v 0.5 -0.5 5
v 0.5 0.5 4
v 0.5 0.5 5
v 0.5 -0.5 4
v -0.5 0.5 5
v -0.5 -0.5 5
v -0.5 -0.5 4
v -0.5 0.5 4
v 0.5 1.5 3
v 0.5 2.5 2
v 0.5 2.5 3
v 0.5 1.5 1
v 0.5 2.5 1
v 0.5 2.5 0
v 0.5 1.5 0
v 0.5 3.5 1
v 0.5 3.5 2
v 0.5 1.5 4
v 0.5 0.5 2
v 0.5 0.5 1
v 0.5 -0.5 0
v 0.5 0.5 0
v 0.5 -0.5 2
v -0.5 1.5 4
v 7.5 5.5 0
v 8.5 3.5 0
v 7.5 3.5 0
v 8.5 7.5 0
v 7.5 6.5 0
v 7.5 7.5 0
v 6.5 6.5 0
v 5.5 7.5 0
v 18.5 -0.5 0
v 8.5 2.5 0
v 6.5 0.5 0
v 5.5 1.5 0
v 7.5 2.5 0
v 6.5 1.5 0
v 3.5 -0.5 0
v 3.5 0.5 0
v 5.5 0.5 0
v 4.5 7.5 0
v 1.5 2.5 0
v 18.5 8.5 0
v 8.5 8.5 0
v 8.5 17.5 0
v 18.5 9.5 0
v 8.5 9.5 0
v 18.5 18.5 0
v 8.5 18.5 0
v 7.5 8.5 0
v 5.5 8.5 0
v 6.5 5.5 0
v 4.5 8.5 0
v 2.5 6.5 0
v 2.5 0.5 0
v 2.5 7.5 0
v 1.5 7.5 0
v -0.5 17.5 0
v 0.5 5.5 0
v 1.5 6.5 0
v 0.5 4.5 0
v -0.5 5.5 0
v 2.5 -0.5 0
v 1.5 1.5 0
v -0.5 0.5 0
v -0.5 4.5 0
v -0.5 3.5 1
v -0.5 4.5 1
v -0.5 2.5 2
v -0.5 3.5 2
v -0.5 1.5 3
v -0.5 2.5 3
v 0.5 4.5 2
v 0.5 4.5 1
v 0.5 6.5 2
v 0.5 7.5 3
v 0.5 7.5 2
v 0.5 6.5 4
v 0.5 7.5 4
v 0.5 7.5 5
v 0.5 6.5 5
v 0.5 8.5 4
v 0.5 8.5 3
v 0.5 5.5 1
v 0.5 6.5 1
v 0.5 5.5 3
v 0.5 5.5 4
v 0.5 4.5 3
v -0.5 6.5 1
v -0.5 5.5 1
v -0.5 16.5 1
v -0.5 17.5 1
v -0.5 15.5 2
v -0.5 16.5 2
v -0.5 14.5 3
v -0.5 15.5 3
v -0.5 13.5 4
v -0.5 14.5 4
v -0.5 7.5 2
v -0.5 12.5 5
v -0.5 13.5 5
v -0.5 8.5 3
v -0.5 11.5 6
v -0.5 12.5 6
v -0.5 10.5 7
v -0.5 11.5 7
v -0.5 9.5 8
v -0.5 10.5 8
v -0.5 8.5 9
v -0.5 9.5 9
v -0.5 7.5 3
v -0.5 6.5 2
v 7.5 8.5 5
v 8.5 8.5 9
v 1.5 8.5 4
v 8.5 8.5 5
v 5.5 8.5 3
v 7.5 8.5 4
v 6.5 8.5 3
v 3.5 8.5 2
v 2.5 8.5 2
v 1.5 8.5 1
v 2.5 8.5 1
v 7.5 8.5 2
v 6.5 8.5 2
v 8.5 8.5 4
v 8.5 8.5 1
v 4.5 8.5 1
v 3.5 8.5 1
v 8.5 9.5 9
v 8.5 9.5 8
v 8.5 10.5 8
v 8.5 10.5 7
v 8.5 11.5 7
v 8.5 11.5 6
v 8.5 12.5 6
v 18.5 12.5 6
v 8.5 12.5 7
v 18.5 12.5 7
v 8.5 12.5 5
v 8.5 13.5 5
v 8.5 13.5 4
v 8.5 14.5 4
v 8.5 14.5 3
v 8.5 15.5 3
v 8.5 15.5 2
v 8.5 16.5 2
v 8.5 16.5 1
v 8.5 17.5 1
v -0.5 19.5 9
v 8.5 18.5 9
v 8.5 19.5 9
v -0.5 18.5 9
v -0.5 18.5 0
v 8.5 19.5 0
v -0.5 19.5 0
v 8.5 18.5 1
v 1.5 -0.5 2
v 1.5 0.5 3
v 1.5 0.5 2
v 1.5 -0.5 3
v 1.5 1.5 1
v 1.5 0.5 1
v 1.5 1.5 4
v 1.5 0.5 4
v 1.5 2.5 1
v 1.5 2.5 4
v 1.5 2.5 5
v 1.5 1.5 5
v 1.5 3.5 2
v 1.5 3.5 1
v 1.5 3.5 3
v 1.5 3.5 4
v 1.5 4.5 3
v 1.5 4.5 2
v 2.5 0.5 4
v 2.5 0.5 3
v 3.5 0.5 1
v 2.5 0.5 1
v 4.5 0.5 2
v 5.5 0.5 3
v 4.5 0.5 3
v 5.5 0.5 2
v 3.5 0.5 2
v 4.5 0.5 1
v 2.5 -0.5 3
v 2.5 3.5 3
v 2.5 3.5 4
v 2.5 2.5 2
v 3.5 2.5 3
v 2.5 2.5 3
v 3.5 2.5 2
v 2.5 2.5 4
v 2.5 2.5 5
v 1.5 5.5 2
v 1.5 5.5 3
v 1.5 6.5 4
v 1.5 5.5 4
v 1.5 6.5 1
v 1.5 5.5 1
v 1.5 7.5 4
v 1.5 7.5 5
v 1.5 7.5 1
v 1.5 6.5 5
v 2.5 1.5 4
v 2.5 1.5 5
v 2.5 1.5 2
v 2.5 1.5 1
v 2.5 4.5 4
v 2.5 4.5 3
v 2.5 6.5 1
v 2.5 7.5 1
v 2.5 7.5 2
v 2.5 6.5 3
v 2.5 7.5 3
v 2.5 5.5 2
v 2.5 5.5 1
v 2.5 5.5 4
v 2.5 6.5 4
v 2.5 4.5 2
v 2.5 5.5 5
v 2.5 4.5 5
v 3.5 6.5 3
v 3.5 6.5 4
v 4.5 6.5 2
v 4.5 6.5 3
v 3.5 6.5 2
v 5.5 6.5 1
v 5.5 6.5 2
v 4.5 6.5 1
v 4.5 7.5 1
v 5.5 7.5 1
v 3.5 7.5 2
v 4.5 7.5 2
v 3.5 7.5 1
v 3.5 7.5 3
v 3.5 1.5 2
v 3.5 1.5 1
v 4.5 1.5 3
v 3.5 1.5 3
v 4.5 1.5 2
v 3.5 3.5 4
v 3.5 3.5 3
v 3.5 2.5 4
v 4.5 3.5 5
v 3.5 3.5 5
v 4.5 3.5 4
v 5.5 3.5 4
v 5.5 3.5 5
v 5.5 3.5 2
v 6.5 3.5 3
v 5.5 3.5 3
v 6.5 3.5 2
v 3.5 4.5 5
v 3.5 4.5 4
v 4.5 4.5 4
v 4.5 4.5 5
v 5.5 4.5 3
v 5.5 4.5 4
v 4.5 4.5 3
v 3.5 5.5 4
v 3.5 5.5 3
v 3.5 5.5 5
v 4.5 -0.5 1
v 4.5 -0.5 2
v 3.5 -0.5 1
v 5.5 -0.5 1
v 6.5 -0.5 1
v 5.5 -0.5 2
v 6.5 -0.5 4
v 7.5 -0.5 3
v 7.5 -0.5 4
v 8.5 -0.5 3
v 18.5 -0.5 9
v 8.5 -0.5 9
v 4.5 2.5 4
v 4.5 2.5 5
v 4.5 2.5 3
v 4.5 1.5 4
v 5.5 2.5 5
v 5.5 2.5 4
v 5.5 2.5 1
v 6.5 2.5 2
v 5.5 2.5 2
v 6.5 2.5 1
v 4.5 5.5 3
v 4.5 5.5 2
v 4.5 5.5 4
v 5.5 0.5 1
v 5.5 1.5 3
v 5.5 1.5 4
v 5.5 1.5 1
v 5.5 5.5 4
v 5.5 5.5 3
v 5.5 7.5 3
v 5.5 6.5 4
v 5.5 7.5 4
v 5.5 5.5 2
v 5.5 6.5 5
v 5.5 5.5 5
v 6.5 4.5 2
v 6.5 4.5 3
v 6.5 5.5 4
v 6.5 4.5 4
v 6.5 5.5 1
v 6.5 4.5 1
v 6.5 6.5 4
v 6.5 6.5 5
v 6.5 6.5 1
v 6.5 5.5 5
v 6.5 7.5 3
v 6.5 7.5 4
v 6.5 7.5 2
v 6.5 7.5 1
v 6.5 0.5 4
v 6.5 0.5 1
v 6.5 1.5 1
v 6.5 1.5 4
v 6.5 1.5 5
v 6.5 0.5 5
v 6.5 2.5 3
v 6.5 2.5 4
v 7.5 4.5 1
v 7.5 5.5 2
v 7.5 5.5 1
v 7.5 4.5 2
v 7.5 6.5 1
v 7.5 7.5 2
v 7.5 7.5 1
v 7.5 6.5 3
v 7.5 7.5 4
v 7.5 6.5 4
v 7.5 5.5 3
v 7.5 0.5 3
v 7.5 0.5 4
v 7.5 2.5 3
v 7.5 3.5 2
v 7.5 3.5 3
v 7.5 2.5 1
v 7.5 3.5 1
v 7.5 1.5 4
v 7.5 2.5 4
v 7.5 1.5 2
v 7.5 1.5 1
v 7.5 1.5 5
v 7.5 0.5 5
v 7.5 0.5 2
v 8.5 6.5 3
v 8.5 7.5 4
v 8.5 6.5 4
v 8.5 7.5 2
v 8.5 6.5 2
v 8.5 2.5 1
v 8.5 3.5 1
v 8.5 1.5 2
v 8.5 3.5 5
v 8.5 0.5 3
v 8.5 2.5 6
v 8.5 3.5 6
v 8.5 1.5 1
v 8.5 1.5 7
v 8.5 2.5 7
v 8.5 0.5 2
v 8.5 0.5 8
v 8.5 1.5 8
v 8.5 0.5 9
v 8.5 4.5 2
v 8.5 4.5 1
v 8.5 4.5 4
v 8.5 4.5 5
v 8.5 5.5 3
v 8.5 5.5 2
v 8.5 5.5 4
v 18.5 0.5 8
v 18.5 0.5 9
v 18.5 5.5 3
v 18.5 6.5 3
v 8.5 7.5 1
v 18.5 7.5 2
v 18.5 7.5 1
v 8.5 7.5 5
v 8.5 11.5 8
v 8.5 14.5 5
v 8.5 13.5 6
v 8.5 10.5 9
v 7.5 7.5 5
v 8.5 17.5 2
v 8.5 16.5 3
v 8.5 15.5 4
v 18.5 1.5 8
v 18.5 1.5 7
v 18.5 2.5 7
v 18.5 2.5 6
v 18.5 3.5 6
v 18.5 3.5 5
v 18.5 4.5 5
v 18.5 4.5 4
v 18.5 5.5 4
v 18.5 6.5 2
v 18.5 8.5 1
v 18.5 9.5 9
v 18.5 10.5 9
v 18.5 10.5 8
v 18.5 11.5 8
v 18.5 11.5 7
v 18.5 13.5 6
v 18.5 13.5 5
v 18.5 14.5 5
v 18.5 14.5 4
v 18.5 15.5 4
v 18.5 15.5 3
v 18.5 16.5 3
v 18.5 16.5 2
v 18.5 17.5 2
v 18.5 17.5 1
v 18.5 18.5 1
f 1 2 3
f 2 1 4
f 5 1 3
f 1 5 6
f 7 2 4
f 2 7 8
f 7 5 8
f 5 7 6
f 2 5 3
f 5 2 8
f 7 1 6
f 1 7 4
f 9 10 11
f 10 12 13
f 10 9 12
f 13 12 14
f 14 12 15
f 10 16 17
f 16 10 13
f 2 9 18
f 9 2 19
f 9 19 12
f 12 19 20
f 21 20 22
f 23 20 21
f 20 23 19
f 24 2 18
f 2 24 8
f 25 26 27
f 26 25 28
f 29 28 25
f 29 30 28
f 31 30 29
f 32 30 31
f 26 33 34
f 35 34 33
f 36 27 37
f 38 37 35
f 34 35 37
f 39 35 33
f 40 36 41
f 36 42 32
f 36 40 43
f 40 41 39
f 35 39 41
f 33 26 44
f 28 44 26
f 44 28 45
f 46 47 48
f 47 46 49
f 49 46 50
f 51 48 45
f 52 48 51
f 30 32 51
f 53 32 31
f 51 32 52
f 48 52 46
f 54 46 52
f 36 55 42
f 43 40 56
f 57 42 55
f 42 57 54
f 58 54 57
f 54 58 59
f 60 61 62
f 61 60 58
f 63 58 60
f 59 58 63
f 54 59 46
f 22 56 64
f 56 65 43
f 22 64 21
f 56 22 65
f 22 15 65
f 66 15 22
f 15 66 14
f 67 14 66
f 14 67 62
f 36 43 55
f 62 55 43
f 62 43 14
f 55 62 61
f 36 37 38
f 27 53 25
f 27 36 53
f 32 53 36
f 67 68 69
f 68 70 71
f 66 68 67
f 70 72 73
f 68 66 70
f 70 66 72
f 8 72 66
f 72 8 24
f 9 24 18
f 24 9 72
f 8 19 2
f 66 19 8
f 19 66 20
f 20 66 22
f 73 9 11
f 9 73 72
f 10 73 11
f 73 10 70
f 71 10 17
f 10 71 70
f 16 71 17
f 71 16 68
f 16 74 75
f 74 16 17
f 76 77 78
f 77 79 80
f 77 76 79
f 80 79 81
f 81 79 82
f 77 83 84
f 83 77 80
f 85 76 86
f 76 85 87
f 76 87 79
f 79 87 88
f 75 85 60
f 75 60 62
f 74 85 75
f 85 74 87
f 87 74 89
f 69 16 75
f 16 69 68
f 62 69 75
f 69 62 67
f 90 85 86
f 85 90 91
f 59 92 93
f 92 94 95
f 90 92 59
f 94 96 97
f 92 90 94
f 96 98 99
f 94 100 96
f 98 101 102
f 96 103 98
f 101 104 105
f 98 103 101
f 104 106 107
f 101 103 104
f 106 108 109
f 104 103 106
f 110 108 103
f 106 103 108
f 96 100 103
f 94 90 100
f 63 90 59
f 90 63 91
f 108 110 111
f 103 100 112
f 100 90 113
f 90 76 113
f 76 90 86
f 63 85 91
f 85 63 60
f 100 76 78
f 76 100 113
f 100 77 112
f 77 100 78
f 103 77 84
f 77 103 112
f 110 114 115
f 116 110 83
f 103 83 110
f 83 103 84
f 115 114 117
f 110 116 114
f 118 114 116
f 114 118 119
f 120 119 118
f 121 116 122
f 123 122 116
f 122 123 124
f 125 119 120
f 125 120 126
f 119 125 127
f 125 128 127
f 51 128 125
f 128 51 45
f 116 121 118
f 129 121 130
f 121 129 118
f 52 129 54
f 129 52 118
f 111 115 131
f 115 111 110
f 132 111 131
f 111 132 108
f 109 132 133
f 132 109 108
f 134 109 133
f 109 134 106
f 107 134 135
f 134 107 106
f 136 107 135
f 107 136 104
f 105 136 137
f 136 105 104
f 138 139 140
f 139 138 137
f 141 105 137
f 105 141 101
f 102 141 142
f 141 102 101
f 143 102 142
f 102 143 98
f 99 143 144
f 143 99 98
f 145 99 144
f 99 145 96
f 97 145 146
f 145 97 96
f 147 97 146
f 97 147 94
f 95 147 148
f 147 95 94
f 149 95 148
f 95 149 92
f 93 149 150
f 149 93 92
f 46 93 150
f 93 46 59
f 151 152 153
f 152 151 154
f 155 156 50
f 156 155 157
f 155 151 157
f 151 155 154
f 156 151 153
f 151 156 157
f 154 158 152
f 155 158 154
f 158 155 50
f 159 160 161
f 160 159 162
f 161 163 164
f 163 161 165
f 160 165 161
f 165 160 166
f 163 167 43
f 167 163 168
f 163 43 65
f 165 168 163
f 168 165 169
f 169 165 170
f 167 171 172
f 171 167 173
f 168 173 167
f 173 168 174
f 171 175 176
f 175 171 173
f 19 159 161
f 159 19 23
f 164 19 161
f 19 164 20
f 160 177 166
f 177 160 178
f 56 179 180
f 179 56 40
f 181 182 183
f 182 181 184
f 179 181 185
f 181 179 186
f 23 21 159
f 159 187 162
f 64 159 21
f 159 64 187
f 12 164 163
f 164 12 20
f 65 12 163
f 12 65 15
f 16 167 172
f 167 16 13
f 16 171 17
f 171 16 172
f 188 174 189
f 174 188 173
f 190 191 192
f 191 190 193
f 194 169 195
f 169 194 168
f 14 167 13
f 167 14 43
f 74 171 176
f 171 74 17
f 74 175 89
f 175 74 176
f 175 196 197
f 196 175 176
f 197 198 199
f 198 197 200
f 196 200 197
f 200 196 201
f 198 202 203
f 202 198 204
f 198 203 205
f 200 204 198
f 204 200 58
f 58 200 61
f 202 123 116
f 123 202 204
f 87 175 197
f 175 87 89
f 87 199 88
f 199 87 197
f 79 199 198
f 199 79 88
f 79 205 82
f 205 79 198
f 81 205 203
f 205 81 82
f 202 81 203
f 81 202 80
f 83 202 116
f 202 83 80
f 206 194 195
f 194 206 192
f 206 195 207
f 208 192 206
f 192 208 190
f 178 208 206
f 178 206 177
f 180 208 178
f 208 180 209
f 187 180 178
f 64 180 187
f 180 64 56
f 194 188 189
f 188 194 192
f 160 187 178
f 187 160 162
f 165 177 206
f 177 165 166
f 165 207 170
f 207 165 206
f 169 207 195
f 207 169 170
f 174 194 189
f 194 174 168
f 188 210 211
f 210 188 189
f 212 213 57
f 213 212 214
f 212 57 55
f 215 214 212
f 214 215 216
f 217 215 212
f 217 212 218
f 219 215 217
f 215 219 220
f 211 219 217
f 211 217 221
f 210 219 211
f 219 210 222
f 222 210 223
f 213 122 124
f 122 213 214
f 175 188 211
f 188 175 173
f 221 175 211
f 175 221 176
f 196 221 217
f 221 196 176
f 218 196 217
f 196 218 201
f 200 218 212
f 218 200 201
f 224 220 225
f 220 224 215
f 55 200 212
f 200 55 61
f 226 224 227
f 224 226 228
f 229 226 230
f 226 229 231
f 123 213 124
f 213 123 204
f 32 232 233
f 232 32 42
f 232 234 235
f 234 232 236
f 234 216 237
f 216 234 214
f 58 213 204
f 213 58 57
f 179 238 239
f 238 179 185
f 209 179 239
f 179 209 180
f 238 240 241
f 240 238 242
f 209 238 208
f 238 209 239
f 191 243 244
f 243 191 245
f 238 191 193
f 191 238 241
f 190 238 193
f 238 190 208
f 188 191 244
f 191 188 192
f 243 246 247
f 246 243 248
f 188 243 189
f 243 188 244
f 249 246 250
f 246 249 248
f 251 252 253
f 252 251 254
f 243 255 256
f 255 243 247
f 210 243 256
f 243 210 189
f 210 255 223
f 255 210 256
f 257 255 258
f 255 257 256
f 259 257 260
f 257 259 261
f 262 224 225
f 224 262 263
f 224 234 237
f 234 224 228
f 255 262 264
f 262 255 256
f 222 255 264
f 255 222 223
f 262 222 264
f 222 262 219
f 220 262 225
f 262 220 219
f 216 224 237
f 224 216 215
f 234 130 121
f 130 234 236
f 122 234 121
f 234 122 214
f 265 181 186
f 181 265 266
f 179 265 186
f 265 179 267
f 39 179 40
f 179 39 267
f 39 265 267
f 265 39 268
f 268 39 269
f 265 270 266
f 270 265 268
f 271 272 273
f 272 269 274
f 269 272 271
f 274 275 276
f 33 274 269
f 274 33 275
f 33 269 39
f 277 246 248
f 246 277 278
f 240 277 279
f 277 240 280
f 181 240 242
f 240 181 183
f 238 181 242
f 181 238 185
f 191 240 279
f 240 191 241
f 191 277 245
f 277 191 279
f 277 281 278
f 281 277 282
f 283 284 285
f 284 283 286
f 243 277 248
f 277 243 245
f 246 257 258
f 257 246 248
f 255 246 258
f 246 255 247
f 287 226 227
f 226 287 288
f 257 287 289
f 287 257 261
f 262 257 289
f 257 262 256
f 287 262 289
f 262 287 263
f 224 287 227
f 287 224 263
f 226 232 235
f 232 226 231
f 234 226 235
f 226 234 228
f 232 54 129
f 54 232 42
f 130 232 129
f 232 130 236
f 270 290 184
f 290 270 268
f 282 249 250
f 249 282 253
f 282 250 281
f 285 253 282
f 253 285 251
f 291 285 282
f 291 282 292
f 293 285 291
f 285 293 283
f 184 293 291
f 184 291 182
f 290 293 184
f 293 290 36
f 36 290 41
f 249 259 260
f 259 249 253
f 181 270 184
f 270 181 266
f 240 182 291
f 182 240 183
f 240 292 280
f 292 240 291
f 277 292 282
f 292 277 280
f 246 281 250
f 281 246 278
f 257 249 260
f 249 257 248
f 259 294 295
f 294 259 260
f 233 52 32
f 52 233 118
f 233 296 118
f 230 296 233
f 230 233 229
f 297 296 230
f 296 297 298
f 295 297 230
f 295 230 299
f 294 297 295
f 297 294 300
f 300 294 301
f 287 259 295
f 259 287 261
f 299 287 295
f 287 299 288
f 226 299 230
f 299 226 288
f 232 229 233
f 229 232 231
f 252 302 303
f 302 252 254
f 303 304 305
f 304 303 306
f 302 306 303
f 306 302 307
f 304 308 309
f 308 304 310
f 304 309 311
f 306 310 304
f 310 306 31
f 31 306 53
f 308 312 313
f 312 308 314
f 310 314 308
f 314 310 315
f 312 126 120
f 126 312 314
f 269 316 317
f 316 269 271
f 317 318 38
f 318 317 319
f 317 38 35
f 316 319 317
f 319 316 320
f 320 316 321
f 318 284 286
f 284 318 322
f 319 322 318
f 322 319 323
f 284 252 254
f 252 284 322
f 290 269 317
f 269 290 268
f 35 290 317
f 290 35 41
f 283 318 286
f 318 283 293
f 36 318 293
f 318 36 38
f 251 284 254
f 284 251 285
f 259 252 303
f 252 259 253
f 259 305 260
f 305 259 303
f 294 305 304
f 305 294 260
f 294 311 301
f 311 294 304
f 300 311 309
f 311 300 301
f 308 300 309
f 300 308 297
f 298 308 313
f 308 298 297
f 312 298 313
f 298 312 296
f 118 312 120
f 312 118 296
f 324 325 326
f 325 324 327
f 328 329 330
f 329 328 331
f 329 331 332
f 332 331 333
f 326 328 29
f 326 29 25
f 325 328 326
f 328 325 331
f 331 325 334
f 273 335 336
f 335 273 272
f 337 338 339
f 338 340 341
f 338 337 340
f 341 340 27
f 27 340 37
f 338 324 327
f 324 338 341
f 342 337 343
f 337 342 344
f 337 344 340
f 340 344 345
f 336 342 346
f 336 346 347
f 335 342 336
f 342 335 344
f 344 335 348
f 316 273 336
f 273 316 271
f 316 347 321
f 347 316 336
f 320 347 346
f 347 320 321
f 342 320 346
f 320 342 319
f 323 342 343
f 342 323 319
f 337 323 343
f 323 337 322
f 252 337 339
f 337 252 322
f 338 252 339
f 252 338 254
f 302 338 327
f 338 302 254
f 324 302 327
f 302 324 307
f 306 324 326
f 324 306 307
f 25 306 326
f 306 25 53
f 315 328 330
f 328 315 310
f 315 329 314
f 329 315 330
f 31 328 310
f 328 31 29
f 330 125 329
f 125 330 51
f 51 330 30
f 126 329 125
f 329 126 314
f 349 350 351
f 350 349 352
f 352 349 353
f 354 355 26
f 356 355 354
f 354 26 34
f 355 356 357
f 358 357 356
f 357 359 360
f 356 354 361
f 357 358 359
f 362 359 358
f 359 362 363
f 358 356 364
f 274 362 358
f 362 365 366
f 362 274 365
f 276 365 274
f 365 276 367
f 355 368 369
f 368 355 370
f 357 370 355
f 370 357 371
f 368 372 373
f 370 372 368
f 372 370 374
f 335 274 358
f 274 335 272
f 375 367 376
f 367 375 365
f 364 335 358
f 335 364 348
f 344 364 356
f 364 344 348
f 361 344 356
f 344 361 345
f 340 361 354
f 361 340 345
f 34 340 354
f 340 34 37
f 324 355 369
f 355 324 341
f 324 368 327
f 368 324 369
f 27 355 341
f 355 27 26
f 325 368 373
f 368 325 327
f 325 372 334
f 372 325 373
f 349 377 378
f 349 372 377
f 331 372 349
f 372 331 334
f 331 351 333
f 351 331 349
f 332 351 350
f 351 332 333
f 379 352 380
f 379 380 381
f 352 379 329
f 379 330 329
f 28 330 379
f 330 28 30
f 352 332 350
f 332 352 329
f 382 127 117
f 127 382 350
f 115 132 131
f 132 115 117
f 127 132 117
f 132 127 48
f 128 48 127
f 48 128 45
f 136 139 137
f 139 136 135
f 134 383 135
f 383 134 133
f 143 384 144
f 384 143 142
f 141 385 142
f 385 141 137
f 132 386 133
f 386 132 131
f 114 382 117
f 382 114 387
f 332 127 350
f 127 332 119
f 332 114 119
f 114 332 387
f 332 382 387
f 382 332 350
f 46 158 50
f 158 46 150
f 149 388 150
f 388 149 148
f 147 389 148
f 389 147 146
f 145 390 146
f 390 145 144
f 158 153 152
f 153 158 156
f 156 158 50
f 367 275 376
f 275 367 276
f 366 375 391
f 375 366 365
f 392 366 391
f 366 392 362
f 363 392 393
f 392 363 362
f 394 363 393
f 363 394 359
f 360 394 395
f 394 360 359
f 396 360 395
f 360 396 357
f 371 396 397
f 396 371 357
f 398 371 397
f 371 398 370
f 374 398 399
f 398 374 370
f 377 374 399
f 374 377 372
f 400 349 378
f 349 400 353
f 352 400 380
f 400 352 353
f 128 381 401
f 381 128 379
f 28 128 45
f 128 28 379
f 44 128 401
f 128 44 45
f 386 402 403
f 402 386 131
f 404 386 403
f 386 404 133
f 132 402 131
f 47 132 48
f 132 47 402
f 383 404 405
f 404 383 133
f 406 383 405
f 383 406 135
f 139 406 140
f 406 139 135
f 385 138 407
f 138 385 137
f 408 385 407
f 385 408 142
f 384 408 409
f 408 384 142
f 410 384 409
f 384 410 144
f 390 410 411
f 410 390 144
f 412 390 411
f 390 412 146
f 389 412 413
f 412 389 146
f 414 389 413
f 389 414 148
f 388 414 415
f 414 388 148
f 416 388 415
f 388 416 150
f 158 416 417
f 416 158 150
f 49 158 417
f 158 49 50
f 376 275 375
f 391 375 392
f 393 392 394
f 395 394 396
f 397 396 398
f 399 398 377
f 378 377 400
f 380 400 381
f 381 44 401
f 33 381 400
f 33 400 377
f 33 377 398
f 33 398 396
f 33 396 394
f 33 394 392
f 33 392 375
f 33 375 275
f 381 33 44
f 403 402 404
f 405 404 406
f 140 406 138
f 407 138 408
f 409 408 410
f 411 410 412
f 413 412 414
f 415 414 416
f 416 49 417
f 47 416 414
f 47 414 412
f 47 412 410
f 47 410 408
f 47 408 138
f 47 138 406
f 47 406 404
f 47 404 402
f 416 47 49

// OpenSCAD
union() {
    translate([0, 0, 4.5]) color([1, 0, 0]) cube([1, 1, 1], center=true);
    translate([0, 1, 2.0]) cube([1, 1, 4], center=true);
    translate([0, 2, 1.5]) cube([1, 1, 3], center=true);
    translate([0, 3, 1.0]) cube([1, 1, 2], center=true);
    translate([0, 4, 0.5]) cube([1, 1, 1], center=true);
    translate([0, 6, 0.5]) cube([1, 1, 1], center=true);
    translate([0, 7, 1.0]) cube([1, 1, 2], center=true);
    translate([0, 8, 1.5]) cube([1, 1, 3], center=true);
    translate([0, 9, 4.5]) cube([1, 1, 9], center=true);
    translate([0, 10, 4.0]) cube([1, 1, 8], center=true);
    translate([0, 11, 3.5]) cube([1, 1, 7], center=true);
    translate([0, 12, 3.0]) cube([1, 1, 6], center=true);
    translate([0, 13, 2.5]) cube([1, 1, 5], center=true);
    translate([0, 14, 2.0]) cube([1, 1, 4], center=true);
    translate([0, 15, 1.5]) cube([1, 1, 3], center=true);
    translate([0, 16, 1.0]) cube([1, 1, 2], center=true);
    translate([0, 17, 0.5]) cube([1, 1, 1], center=true);
    translate([0, 19, 4.5]) cube([1, 1, 9], center=true);
    translate([1, 0, 1.0]) cube([1, 1, 2], center=true);
    translate([1, 1, 0.5]) cube([1, 1, 1], center=true);
    translate([1, 3, 0.5]) cube([1, 1, 1], center=true);
    translate([1, 4, 1.0]) cube([1, 1, 2], center=true);
    translate([1, 5, 1.5]) cube([1, 1, 3], center=true);
    translate([1, 6, 2.0]) cube([1, 1, 4], center=true);
    translate([1, 7, 2.5]) cube([1, 1, 5], center=true);
    translate([1, 8, 2.0]) cube([1, 1, 4], center=true);
    translate([1, 9, 4.5]) cube([1, 1, 9], center=true);
    translate([1, 10, 4.0]) cube([1, 1, 8], center=true);
    translate([1, 11, 3.5]) cube([1, 1, 7], center=true);
    translate([1, 12, 3.0]) cube([1, 1, 6], center=true);
    translate([1, 13, 2.5]) cube([1, 1, 5], center=true);
    translate([1, 14, 2.0]) cube([1, 1, 4], center=true);
    translate([1, 15, 1.5]) cube([1, 1, 3], center=true);
    translate([1, 16, 1.0]) cube([1, 1, 2], center=true);
    translate([1, 17, 0.5]) cube([1, 1, 1], center=true);
    translate([1, 19, 4.5]) cube([1, 1, 9], center=true);
    translate([2, 0, 1.5]) cube([1, 1, 3], center=true);
    translate([2, 1, 2.0]) cube([1, 1, 4], center=true);
    translate([2, 2, 2.5]) cube([1, 1, 5], center=true);
    translate([2, 3, 2.0]) cube([1, 1, 4], center=true);
    translate([2, 4, 1.5]) cube([1, 1, 3], center=true);
    translate([2, 5, 1.0]) cube([1, 1, 2], center=true);
    translate([2, 6, 0.5]) cube([1, 1, 1], center=true);
    translate([2, 8, 0.5]) cube([1, 1, 1], center=true);
    translate([2, 9, 4.5]) cube([1, 1, 9], center=true);
    translate([2, 10, 4.0]) cube([1, 1, 8], center=true);
    translate([2, 11, 3.5]) cube([1, 1, 7], center=true);
    translate([2, 12, 3.0]) cube([1, 1, 6], center=true);
    translate([2, 13, 2.5]) cube([1, 1, 5], center=true);
    translate([2, 14, 2.0]) cube([1, 1, 4], center=true);
    translate([2, 15, 1.5]) cube([1, 1, 3], center=true);
    translate([2, 16, 1.0]) cube([1, 1, 2], center=true);
    translate([2, 17, 0.5]) cube([1, 1, 1], center=true);
    translate([2, 19, 4.5]) cube([1, 1, 9], center=true);
    translate([3, 1, 0.5]) cube([1, 1, 1], center=true);
    translate([3, 2, 1.0]) cube([1, 1, 2], center=true);
    translate([3, 3, 1.5]) cube([1, 1, 3], center=true);
    translate([3, 4, 2.0]) cube([1, 1, 4], center=true);
    translate([3, 5, 2.5]) cube([1, 1, 5], center=true);
    translate([3, 6, 2.0]) cube([1, 1, 4], center=true);
    translate([3, 7, 1.5]) cube([1, 1, 3], center=true);
    translate([3, 8, 1.0]) cube([1, 1, 2], center=true);
    translate([3, 9, 4.5]) cube([1, 1, 9], center=true);
    translate([3, 10, 4.0]) cube([1, 1, 8], center=true);
    translate([3, 11, 3.5]) cube([1, 1, 7], center=true);
    translate([3, 12, 3.0]) cube([1, 1, 6], center=true);
    translate([3, 13, 2.5]) cube([1, 1, 5], center=true);
    translate([3, 14, 2.0]) cube([1, 1, 4], center=true);
    translate([3, 15, 1.5]) cube([1, 1, 3], center=true);
    translate([3, 16, 1.0]) cube([1, 1, 2], center=true);
    translate([3, 17, 0.5]) cube([1, 1, 1], center=true);
    translate([3, 19, 4.5]) cube([1, 1, 9], center=true);
    translate([4, 0, 0.5]) cube([1, 1, 1], center=true);
    translate([4, 1, 1.0]) cube([1, 1, 2], center=true);
    translate([4, 2, 1.5]) cube([1, 1, 3], center=true);
    translate([4, 3, 2.0]) cube([1, 1, 4], center=true);
    translate([4, 4, 2.5]) cube([1, 1, 5], center=true);
    translate([4, 5, 2.0]) cube([1, 1, 4], center=true);
    translate([4, 6, 1.5]) cube([1, 1, 3], center=true);
    translate([4, 7, 1.0]) cube([1, 1, 2], center=true);
    translate([4, 8, 0.5]) cube([1, 1, 1], center=true);
    translate([4, 9, 4.5]) cube([1, 1, 9], center=true);
    translate([4, 10, 4.0]) cube([1, 1, 8], center=true);
    translate([4, 11, 3.5]) cube([1, 1, 7], center=true);
    translate([4, 12, 3.0]) cube([1, 1, 6], center=true);
    translate([4, 13, 2.5]) cube([1, 1, 5], center=true);
    translate([4, 14, 2.0]) cube([1, 1, 4], center=true);
    translate([4, 15, 1.5]) cube([1, 1, 3], center=true);
    translate([4, 16, 1.0]) cube([1, 1, 2], center=true);
    translate([4, 17, 0.5]) cube([1, 1, 1], center=true);
    translate([4, 19, 4.5]) cube([1, 1, 9], center=true);
    translate([5, 0, 1.0]) cube([1, 1, 2], center=true);
    translate([5, 1, 1.5]) cube([1, 1, 3], center=true);
    translate([5, 2, 2.0]) cube([1, 1, 4], center=true);
    translate([5, 3, 2.5]) cube([1, 1, 5], center=true);
    translate([5, 4, 2.0]) cube([1, 1, 4], center=true);
    translate([5, 5, 1.5]) cube([1, 1, 3], center=true);
    translate([5, 6, 1.0]) cube([1, 1, 2], center=true);
    translate([5, 7, 0.5]) cube([1, 1, 1], center=true);
    translate([5, 9, 4.5]) cube([1, 1, 9], center=true);
    translate([5, 10, 4.0]) cube([1, 1, 8], center=true);
    translate([5, 11, 3.5]) cube([1, 1, 7], center=true);
    translate([5, 12, 3.0]) cube([1, 1, 6], center=true);
    translate([5, 13, 2.5]) cube([1, 1, 5], center=true);
    translate([5, 14, 2.0]) cube([1, 1, 4], center=true);
    translate([5, 15, 1.5]) cube([1, 1, 3], center=true);
    translate([5, 16, 1.0]) cube([1, 1, 2], center=true);
    translate([5, 17, 0.5]) cube([1, 1, 1], center=true);
    translate([5, 19, 4.5]) cube([1, 1, 9], center=true);
    translate([6, 0, 0.5]) cube([1, 1, 1], center=true);
    translate([6, 2, 0.5]) cube([1, 1, 1], center=true);
    translate([6, 3, 1.0]) cube([1, 1, 2], center=true);
    translate([6, 4, 1.5]) cube([1, 1, 3], center=true);
    translate([6, 5, 2.0]) cube([1, 1, 4], center=true);
    translate([6, 6, 2.5]) cube([1, 1, 5], center=true);
    translate([6, 7, 2.0]) cube([1, 1, 4], center=true);
    translate([6, 8, 1.5]) cube([1, 1, 3], center=true);
    translate([6, 9, 4.5]) cube([1, 1, 9], center=true);
    translate([6, 10, 4.0]) cube([1, 1, 8], center=true);
    translate([6, 11, 3.5]) cube([1, 1, 7], center=true);
    translate([6, 12, 3.0]) cube([1, 1, 6], center=true);
    translate([6, 13, 2.5]) cube([1, 1, 5], center=true);
    translate([6, 14, 2.0]) cube([1, 1, 4], center=true);
    translate([6, 15, 1.5]) cube([1, 1, 3], center=true);
    translate([6, 16, 1.0]) cube([1, 1, 2], center=true);
    translate([6, 17, 0.5]) cube([1, 1, 1], center=true);
    translate([6, 19, 4.5]) cube([1, 1, 9], center=true);
    translate([7, 0, 2.0]) cube([1, 1, 4], center=true);
    translate([7, 1, 2.5]) cube([1, 1, 5], center=true);
    translate([7, 2, 2.0]) cube([1, 1, 4], center=true);
    translate([7, 3, 1.5]) cube([1, 1, 3], center=true);
    translate([7, 4, 1.0]) cube([1, 1, 2], center=true);
    translate([7, 5, 0.5]) cube([1, 1, 1], center=true);
    translate([7, 7, 0.5]) cube([1, 1, 1], center=true);
    translate([7, 8, 1.0]) cube([1, 1, 2], center=true);
    translate([7, 9, 4.5]) cube([1, 1, 9], center=true);
    translate([7, 10, 4.0]) cube([1, 1, 8], center=true);
    translate([7, 11, 3.5]) cube([1, 1, 7], center=true);
    translate([7, 12, 3.0]) cube([1, 1, 6], center=true);
    translate([7, 13, 2.5]) cube([1, 1, 5], center=true);
    translate([7, 14, 2.0]) cube([1, 1, 4], center=true);
    translate([7, 15, 1.5]) cube([1, 1, 3], center=true);
    translate([7, 16, 1.0]) cube([1, 1, 2], center=true);
    translate([7, 17, 0.5]) cube([1, 1, 1], center=true);
    translate([7, 19, 4.5]) cube([1, 1, 9], center=true);
    translate([8, 0, 1.5]) cube([1, 1, 3], center=true);
    translate([8, 1, 1.0]) cube([1, 1, 2], center=true);
    translate([8, 2, 0.5]) cube([1, 1, 1], center=true);
    translate([8, 4, 0.5]) cube([1, 1, 1], center=true);
    translate([8, 5, 1.0]) cube([1, 1, 2], center=true);
    translate([8, 6, 1.5]) cube([1, 1, 3], center=true);
    translate([8, 7, 2.0]) cube([1, 1, 4], center=true);
    translate([8, 8, 4.5]) color([0, 0, 1]) cube([1, 1, 1], center=true);
    translate([8, 9, 4.5]) cube([1, 1, 9], center=true);
    translate([8, 10, 4.0]) cube([1, 1, 8], center=true);
    translate([8, 11, 3.5]) cube([1, 1, 7], center=true);
    translate([8, 12, 3.0]) cube([1, 1, 6], center=true);
    translate([8, 13, 2.5]) cube([1, 1, 5], center=true);
    translate([8, 14, 2.0]) cube([1, 1, 4], center=true);
    translate([8, 15, 1.5]) cube([1, 1, 3], center=true);
    translate([8, 16, 1.0]) cube([1, 1, 2], center=true);
    translate([8, 17, 0.5]) cube([1, 1, 1], center=true);
    translate([8, 19, 4.5]) cube([1, 1, 9], center=true);
    translate([9, 0, 4.5]) cube([1, 1, 9], center=true);
    translate([9, 1, 4.0]) cube([1, 1, 8], center=true);
    translate([9, 2, 3.5]) cube([1, 1, 7], center=true);
    translate([9, 3, 3.0]) cube([1, 1, 6], center=true);
    translate([9, 4, 2.5]) cube([1, 1, 5], center=true);
    translate([9, 5, 2.0]) cube([1, 1, 4], center=true);
    translate([9, 6, 1.5]) cube([1, 1, 3], center=true);
    translate([9, 7, 1.0]) cube([1, 1, 2], center=true);
    translate([9, 8, 0.5]) cube([1, 1, 1], center=true);
    translate([9, 10, 4.5]) cube([1, 1, 9], center=true);
    translate([9, 11, 4.0]) cube([1, 1, 8], center=true);
    translate([9, 12, 3.5]) cube([1, 1, 7], center=true);
    translate([9, 13, 3.0]) cube([1, 1, 6], center=true);
    translate([9, 14, 2.5]) cube([1, 1, 5], center=true);
    translate([9, 15, 2.0]) cube([1, 1, 4], center=true);
    translate([9, 16, 1.5]) cube([1, 1, 3], center=true);
    translate([9, 17, 1.0]) cube([1, 1, 2], center=true);
    translate([9, 18, 0.5]) cube([1, 1, 1], center=true);
    translate([10, 0, 4.5]) cube([1, 1, 9], center=true);
    translate([10, 1, 4.0]) cube([1, 1, 8], center=true);
    translate([10, 2, 3.5]) cube([1, 1, 7], center=true);
    translate([10, 3, 3.0]) cube([1, 1, 6], center=true);
    translate([10, 4, 2.5]) cube([1, 1, 5], center=true);
    translate([10, 5, 2.0]) cube([1, 1, 4], center=true);
    translate([10, 6, 1.5]) cube([1, 1, 3], center=true);
    translate([10, 7, 1.0]) cube([1, 1, 2], center=true);
    translate([10, 8, 0.5]) cube([1, 1, 1], center=true);
    translate([10, 10, 4.5]) cube([1, 1, 9], center=true);
    translate([10, 11, 4.0]) cube([1, 1, 8], center=true);
    translate([10, 12, 3.5]) cube([1, 1, 7], center=true);
    translate([10, 13, 3.0]) cube([1, 1, 6], center=true);
    translate([10, 14, 2.5]) cube([1, 1, 5], center=true);
    translate([10, 15, 2.0]) cube([1, 1, 4], center=true);
    translate([10, 16, 1.5]) cube([1, 1, 3], center=true);
    translate([10, 17, 1.0]) cube([1, 1, 2], center=true);
    translate([10, 18, 0.5]) cube([1, 1, 1], center=true);
    translate([11, 0, 4.5]) cube([1, 1, 9], center=true);
    translate([11, 1, 4.0]) cube([1, 1, 8], center=true);
    translate([11, 2, 3.5]) cube([1, 1, 7], center=true);
    translate([11, 3, 3.0]) cube([1, 1, 6], center=true);
    translate([11, 4, 2.5]) cube([1, 1, 5], center=true);
    translate([11, 5, 2.0]) cube([1, 1, 4], center=true);
    translate([11, 6, 1.5]) cube([1, 1, 3], center=true);
    translate([11, 7, 1.0]) cube([1, 1, 2], center=true);
    translate([11, 8, 0.5]) cube([1, 1, 1], center=true);
    translate([11, 10, 4.5]) cube([1, 1, 9], center=true);
    translate([11, 11, 4.0]) cube([1, 1, 8], center=true);
    translate([11, 12, 3.5]) cube([1, 1, 7], center=true);
    translate([11, 13, 3.0]) cube([1, 1, 6], center=true);
    translate([11, 14, 2.5]) cube([1, 1, 5], center=true);
    translate([11, 15, 2.0]) cube([1, 1, 4], center=true);
    translate([11, 16, 1.5]) cube([1, 1, 3], center=true);
    translate([11, 17, 1.0]) cube([1, 1, 2], center=true);
    translate([11, 18, 0.5]) cube([1, 1, 1], center=true);
    translate([12, 0, 4.5]) cube([1, 1, 9], center=true);
    translate([12, 1, 4.0]) cube([1, 1, 8], center=true);
    translate([12, 2, 3.5]) cube([1, 1, 7], center=true);
    translate([12, 3, 3.0]) cube([1, 1, 6], center=true);
    translate([12, 4, 2.5]) cube([1, 1, 5], center=true);
    translate([12, 5, 2.0]) cube([1, 1, 4], center=true);
    translate([12, 6, 1.5]) cube([1, 1, 3], center=true);
    translate([12, 7, 1.0]) cube([1, 1, 2], center=true);
    translate([12, 8, 0.5]) cube([1, 1, 1], center=true);
    translate([12, 10, 4.5]) cube([1, 1, 9], center=true);
    translate([12, 11, 4.0]) cube([1, 1, 8], center=true);
    translate([12, 12, 3.5]) cube([1, 1, 7], center=true);
    translate([12, 13, 3.0]) cube([1, 1, 6], center=true);
    translate([12, 14, 2.5]) cube([1, 1, 5], center=true);
    translate([12, 15, 2.0]) cube([1, 1, 4], center=true);
    translate([12, 16, 1.5]) cube([1, 1, 3], center=true);
    translate([12, 17, 1.0]) cube([1, 1, 2], center=true);
    translate([12, 18, 0.5]) cube([1, 1, 1], center=true);
    translate([13, 0, 4.5]) cube([1, 1, 9], center=true);
    translate([13, 1, 4.0]) cube([1, 1, 8], center=true);
    translate([13, 2, 3.5]) cube([1, 1, 7], center=true);
    translate([13, 3, 3.0]) cube([1, 1, 6], center=true);
    translate([13, 4, 2.5]) cube([1, 1, 5], center=true);
    translate([13, 5, 2.0]) cube([1, 1, 4], center=true);
    translate([13, 6, 1.5]) cube([1, 1, 3], center=true);
    translate([13, 7, 1.0]) cube([1, 1, 2], center=true);
    translate([13, 8, 0.5]) cube([1, 1, 1], center=true);
    translate([13, 10, 4.5]) cube([1, 1, 9], center=true);
    translate([13, 11, 4.0]) cube([1, 1, 8], center=true);
    translate([13, 12, 3.5]) cube([1, 1, 7], center=true);
    translate([13, 13, 3.0]) cube([1, 1, 6], center=true);
    translate([13, 14, 2.5]) cube([1, 1, 5], center=true);
    translate([13, 15, 2.0]) cube([1, 1, 4], center=true);
    translate([13, 16, 1.5]) cube([1, 1, 3], center=true);
    translate([13, 17, 1.0]) cube([1, 1, 2], center=true);
    translate([13, 18, 0.5]) cube([1, 1, 1], center=true);
    translate([14, 0, 4.5]) cube([1, 1, 9], center=true);
    translate([14, 1, 4.0]) cube([1, 1, 8], center=true);
    translate([14, 2, 3.5]) cube([1, 1, 7], center=true);
    translate([14, 3, 3.0]) cube([1, 1, 6], center=true);
    translate([14, 4, 2.5]) cube([1, 1, 5], center=true);
    translate([14, 5, 2.0]) cube([1, 1, 4], center=true);
    translate([14, 6, 1.5]) cube([1, 1, 3], center=true);
    translate([14, 7, 1.0]) cube([1, 1, 2], center=true);
    translate([14, 8, 0.5]) cube([1, 1, 1], center=true);
    translate([14, 10, 4.5]) cube([1, 1, 9], center=true);
    translate([14, 11, 4.0]) cube([1, 1, 8], center=true);
    translate([14, 12, 3.5]) cube([1, 1, 7], center=true);
    translate([14, 13, 3.0]) cube([1, 1, 6], center=true);
    translate([14, 14, 2.5]) cube([1, 1, 5], center=true);
    translate([14, 15, 2.0]) cube([1, 1, 4], center=true);
    translate([14, 16, 1.5]) cube([1, 1, 3], center=true);
    translate([14, 17, 1.0]) cube([1, 1, 2], center=true);
    translate([14, 18, 0.5]) cube([1, 1, 1], center=true);
    translate([15, 0, 4.5]) cube([1, 1, 9], center=true);
    translate([15, 1, 4.0]) cube([1, 1, 8], center=true);
    translate([15, 2, 3.5]) cube([1, 1, 7], center=true);
    translate([15, 3, 3.0]) cube([1, 1, 6], center=true);
    translate([15, 4, 2.5]) cube([1, 1, 5], center=true);
    translate([15, 5, 2.0]) cube([1, 1, 4], center=true);
    translate([15, 6, 1.5]) cube([1, 1, 3], center=true);
    translate([15, 7, 1.0]) cube([1, 1, 2], center=true);
    translate([15, 8, 0.5]) cube([1, 1, 1], center=true);
    translate([15, 10, 4.5]) cube([1, 1, 9], center=true);
    translate([15, 11, 4.0]) cube([1, 1, 8], center=true);
    translate([15, 12, 3.5]) cube([1, 1, 7], center=true);
    translate([15, 13, 3.0]) cube([1, 1, 6], center=true);
    translate([15, 14, 2.5]) cube([1, 1, 5], center=true);
    translate([15, 15, 2.0]) cube([1, 1, 4], center=true);
    translate([15, 16, 1.5]) cube([1, 1, 3], center=true);
    translate([15, 17, 1.0]) cube([1, 1, 2], center=true);
    translate([15, 18, 0.5]) cube([1, 1, 1], center=true);
    translate([16, 0, 4.5]) cube([1, 1, 9], center=true);
    translate([16, 1, 4.0]) cube([1, 1, 8], center=true);
    translate([16, 2, 3.5]) cube([1, 1, 7], center=true);
    translate([16, 3, 3.0]) cube([1, 1, 6], center=true);
    translate([16, 4, 2.5]) cube([1, 1, 5], center=true);
    translate([16, 5, 2.0]) cube([1, 1, 4], center=true);
    translate([16, 6, 1.5]) cube([1, 1, 3], center=true);
    translate([16, 7, 1.0]) cube([1, 1, 2], center=true);
    translate([16, 8, 0.5]) cube([1, 1, 1], center=true);
    translate([16, 10, 4.5]) cube([1, 1, 9], center=true);
    translate([16, 11, 4.0]) cube([1, 1, 8], center=true);
    translate([16, 12, 3.5]) cube([1, 1, 7], center=true);
    translate([16, 13, 3.0]) cube([1, 1, 6], center=true);
    translate([16, 14, 2.5]) cube([1, 1, 5], center=true);
    translate([16, 15, 2.0]) cube([1, 1, 4], center=true);
    translate([16, 16, 1.5]) cube([1, 1, 3], center=true);
    translate([16, 17, 1.0]) cube([1, 1, 2], center=true);
    translate([16, 18, 0.5]) cube([1, 1, 1], center=true);
    translate([17, 0, 4.5]) cube([1, 1, 9], center=true);
    translate([17, 1, 4.0]) cube([1, 1, 8], center=true);
    translate([17, 2, 3.5]) cube([1, 1, 7], center=true);
    translate([17, 3, 3.0]) cube([1, 1, 6], center=true);
    translate([17, 4, 2.5]) cube([1, 1, 5], center=true);
    translate([17, 5, 2.0]) cube([1, 1, 4], center=true);
    translate([17, 6, 1.5]) cube([1, 1, 3], center=true);
    translate([17, 7, 1.0]) cube([1, 1, 2], center=true);
    translate([17, 8, 0.5]) cube([1, 1, 1], center=true);
    translate([17, 10, 4.5]) cube([1, 1, 9], center=true);
    translate([17, 11, 4.0]) cube([1, 1, 8], center=true);
    translate([17, 12, 3.5]) cube([1, 1, 7], center=true);
    translate([17, 13, 3.0]) cube([1, 1, 6], center=true);
    translate([17, 14, 2.5]) cube([1, 1, 5], center=true);
    translate([17, 15, 2.0]) cube([1, 1, 4], center=true);
    translate([17, 16, 1.5]) cube([1, 1, 3], center=true);
    translate([17, 17, 1.0]) cube([1, 1, 2], center=true);
    translate([17, 18, 0.5]) cube([1, 1, 1], center=true);
    translate([18, 0, 4.5]) cube([1, 1, 9], center=true);
    translate([18, 1, 4.0]) cube([1, 1, 8], center=true);
    translate([18, 2, 3.5]) cube([1, 1, 7], center=true);
    translate([18, 3, 3.0]) cube([1, 1, 6], center=true);
    translate([18, 4, 2.5]) cube([1, 1, 5], center=true);
    translate([18, 5, 2.0]) cube([1, 1, 4], center=true);
    translate([18, 6, 1.5]) cube([1, 1, 3], center=true);
    translate([18, 7, 1.0]) cube([1, 1, 2], center=true);
    translate([18, 8, 0.5]) cube([1, 1, 1], center=true);
    translate([18, 10, 4.5]) cube([1, 1, 9], center=true);
    translate([18, 11, 4.0]) cube([1, 1, 8], center=true);
    translate([18, 12, 3.5]) cube([1, 1, 7], center=true);
    translate([18, 13, 3.0]) cube([1, 1, 6], center=true);
    translate([18, 14, 2.5]) cube([1, 1, 5], center=true);
    translate([18, 15, 2.0]) cube([1, 1, 4], center=true);
    translate([18, 16, 1.5]) cube([1, 1, 3], center=true);
    translate([18, 17, 1.0]) cube([1, 1, 2], center=true);
    translate([18, 18, 0.5]) cube([1, 1, 1], center=true);
}
